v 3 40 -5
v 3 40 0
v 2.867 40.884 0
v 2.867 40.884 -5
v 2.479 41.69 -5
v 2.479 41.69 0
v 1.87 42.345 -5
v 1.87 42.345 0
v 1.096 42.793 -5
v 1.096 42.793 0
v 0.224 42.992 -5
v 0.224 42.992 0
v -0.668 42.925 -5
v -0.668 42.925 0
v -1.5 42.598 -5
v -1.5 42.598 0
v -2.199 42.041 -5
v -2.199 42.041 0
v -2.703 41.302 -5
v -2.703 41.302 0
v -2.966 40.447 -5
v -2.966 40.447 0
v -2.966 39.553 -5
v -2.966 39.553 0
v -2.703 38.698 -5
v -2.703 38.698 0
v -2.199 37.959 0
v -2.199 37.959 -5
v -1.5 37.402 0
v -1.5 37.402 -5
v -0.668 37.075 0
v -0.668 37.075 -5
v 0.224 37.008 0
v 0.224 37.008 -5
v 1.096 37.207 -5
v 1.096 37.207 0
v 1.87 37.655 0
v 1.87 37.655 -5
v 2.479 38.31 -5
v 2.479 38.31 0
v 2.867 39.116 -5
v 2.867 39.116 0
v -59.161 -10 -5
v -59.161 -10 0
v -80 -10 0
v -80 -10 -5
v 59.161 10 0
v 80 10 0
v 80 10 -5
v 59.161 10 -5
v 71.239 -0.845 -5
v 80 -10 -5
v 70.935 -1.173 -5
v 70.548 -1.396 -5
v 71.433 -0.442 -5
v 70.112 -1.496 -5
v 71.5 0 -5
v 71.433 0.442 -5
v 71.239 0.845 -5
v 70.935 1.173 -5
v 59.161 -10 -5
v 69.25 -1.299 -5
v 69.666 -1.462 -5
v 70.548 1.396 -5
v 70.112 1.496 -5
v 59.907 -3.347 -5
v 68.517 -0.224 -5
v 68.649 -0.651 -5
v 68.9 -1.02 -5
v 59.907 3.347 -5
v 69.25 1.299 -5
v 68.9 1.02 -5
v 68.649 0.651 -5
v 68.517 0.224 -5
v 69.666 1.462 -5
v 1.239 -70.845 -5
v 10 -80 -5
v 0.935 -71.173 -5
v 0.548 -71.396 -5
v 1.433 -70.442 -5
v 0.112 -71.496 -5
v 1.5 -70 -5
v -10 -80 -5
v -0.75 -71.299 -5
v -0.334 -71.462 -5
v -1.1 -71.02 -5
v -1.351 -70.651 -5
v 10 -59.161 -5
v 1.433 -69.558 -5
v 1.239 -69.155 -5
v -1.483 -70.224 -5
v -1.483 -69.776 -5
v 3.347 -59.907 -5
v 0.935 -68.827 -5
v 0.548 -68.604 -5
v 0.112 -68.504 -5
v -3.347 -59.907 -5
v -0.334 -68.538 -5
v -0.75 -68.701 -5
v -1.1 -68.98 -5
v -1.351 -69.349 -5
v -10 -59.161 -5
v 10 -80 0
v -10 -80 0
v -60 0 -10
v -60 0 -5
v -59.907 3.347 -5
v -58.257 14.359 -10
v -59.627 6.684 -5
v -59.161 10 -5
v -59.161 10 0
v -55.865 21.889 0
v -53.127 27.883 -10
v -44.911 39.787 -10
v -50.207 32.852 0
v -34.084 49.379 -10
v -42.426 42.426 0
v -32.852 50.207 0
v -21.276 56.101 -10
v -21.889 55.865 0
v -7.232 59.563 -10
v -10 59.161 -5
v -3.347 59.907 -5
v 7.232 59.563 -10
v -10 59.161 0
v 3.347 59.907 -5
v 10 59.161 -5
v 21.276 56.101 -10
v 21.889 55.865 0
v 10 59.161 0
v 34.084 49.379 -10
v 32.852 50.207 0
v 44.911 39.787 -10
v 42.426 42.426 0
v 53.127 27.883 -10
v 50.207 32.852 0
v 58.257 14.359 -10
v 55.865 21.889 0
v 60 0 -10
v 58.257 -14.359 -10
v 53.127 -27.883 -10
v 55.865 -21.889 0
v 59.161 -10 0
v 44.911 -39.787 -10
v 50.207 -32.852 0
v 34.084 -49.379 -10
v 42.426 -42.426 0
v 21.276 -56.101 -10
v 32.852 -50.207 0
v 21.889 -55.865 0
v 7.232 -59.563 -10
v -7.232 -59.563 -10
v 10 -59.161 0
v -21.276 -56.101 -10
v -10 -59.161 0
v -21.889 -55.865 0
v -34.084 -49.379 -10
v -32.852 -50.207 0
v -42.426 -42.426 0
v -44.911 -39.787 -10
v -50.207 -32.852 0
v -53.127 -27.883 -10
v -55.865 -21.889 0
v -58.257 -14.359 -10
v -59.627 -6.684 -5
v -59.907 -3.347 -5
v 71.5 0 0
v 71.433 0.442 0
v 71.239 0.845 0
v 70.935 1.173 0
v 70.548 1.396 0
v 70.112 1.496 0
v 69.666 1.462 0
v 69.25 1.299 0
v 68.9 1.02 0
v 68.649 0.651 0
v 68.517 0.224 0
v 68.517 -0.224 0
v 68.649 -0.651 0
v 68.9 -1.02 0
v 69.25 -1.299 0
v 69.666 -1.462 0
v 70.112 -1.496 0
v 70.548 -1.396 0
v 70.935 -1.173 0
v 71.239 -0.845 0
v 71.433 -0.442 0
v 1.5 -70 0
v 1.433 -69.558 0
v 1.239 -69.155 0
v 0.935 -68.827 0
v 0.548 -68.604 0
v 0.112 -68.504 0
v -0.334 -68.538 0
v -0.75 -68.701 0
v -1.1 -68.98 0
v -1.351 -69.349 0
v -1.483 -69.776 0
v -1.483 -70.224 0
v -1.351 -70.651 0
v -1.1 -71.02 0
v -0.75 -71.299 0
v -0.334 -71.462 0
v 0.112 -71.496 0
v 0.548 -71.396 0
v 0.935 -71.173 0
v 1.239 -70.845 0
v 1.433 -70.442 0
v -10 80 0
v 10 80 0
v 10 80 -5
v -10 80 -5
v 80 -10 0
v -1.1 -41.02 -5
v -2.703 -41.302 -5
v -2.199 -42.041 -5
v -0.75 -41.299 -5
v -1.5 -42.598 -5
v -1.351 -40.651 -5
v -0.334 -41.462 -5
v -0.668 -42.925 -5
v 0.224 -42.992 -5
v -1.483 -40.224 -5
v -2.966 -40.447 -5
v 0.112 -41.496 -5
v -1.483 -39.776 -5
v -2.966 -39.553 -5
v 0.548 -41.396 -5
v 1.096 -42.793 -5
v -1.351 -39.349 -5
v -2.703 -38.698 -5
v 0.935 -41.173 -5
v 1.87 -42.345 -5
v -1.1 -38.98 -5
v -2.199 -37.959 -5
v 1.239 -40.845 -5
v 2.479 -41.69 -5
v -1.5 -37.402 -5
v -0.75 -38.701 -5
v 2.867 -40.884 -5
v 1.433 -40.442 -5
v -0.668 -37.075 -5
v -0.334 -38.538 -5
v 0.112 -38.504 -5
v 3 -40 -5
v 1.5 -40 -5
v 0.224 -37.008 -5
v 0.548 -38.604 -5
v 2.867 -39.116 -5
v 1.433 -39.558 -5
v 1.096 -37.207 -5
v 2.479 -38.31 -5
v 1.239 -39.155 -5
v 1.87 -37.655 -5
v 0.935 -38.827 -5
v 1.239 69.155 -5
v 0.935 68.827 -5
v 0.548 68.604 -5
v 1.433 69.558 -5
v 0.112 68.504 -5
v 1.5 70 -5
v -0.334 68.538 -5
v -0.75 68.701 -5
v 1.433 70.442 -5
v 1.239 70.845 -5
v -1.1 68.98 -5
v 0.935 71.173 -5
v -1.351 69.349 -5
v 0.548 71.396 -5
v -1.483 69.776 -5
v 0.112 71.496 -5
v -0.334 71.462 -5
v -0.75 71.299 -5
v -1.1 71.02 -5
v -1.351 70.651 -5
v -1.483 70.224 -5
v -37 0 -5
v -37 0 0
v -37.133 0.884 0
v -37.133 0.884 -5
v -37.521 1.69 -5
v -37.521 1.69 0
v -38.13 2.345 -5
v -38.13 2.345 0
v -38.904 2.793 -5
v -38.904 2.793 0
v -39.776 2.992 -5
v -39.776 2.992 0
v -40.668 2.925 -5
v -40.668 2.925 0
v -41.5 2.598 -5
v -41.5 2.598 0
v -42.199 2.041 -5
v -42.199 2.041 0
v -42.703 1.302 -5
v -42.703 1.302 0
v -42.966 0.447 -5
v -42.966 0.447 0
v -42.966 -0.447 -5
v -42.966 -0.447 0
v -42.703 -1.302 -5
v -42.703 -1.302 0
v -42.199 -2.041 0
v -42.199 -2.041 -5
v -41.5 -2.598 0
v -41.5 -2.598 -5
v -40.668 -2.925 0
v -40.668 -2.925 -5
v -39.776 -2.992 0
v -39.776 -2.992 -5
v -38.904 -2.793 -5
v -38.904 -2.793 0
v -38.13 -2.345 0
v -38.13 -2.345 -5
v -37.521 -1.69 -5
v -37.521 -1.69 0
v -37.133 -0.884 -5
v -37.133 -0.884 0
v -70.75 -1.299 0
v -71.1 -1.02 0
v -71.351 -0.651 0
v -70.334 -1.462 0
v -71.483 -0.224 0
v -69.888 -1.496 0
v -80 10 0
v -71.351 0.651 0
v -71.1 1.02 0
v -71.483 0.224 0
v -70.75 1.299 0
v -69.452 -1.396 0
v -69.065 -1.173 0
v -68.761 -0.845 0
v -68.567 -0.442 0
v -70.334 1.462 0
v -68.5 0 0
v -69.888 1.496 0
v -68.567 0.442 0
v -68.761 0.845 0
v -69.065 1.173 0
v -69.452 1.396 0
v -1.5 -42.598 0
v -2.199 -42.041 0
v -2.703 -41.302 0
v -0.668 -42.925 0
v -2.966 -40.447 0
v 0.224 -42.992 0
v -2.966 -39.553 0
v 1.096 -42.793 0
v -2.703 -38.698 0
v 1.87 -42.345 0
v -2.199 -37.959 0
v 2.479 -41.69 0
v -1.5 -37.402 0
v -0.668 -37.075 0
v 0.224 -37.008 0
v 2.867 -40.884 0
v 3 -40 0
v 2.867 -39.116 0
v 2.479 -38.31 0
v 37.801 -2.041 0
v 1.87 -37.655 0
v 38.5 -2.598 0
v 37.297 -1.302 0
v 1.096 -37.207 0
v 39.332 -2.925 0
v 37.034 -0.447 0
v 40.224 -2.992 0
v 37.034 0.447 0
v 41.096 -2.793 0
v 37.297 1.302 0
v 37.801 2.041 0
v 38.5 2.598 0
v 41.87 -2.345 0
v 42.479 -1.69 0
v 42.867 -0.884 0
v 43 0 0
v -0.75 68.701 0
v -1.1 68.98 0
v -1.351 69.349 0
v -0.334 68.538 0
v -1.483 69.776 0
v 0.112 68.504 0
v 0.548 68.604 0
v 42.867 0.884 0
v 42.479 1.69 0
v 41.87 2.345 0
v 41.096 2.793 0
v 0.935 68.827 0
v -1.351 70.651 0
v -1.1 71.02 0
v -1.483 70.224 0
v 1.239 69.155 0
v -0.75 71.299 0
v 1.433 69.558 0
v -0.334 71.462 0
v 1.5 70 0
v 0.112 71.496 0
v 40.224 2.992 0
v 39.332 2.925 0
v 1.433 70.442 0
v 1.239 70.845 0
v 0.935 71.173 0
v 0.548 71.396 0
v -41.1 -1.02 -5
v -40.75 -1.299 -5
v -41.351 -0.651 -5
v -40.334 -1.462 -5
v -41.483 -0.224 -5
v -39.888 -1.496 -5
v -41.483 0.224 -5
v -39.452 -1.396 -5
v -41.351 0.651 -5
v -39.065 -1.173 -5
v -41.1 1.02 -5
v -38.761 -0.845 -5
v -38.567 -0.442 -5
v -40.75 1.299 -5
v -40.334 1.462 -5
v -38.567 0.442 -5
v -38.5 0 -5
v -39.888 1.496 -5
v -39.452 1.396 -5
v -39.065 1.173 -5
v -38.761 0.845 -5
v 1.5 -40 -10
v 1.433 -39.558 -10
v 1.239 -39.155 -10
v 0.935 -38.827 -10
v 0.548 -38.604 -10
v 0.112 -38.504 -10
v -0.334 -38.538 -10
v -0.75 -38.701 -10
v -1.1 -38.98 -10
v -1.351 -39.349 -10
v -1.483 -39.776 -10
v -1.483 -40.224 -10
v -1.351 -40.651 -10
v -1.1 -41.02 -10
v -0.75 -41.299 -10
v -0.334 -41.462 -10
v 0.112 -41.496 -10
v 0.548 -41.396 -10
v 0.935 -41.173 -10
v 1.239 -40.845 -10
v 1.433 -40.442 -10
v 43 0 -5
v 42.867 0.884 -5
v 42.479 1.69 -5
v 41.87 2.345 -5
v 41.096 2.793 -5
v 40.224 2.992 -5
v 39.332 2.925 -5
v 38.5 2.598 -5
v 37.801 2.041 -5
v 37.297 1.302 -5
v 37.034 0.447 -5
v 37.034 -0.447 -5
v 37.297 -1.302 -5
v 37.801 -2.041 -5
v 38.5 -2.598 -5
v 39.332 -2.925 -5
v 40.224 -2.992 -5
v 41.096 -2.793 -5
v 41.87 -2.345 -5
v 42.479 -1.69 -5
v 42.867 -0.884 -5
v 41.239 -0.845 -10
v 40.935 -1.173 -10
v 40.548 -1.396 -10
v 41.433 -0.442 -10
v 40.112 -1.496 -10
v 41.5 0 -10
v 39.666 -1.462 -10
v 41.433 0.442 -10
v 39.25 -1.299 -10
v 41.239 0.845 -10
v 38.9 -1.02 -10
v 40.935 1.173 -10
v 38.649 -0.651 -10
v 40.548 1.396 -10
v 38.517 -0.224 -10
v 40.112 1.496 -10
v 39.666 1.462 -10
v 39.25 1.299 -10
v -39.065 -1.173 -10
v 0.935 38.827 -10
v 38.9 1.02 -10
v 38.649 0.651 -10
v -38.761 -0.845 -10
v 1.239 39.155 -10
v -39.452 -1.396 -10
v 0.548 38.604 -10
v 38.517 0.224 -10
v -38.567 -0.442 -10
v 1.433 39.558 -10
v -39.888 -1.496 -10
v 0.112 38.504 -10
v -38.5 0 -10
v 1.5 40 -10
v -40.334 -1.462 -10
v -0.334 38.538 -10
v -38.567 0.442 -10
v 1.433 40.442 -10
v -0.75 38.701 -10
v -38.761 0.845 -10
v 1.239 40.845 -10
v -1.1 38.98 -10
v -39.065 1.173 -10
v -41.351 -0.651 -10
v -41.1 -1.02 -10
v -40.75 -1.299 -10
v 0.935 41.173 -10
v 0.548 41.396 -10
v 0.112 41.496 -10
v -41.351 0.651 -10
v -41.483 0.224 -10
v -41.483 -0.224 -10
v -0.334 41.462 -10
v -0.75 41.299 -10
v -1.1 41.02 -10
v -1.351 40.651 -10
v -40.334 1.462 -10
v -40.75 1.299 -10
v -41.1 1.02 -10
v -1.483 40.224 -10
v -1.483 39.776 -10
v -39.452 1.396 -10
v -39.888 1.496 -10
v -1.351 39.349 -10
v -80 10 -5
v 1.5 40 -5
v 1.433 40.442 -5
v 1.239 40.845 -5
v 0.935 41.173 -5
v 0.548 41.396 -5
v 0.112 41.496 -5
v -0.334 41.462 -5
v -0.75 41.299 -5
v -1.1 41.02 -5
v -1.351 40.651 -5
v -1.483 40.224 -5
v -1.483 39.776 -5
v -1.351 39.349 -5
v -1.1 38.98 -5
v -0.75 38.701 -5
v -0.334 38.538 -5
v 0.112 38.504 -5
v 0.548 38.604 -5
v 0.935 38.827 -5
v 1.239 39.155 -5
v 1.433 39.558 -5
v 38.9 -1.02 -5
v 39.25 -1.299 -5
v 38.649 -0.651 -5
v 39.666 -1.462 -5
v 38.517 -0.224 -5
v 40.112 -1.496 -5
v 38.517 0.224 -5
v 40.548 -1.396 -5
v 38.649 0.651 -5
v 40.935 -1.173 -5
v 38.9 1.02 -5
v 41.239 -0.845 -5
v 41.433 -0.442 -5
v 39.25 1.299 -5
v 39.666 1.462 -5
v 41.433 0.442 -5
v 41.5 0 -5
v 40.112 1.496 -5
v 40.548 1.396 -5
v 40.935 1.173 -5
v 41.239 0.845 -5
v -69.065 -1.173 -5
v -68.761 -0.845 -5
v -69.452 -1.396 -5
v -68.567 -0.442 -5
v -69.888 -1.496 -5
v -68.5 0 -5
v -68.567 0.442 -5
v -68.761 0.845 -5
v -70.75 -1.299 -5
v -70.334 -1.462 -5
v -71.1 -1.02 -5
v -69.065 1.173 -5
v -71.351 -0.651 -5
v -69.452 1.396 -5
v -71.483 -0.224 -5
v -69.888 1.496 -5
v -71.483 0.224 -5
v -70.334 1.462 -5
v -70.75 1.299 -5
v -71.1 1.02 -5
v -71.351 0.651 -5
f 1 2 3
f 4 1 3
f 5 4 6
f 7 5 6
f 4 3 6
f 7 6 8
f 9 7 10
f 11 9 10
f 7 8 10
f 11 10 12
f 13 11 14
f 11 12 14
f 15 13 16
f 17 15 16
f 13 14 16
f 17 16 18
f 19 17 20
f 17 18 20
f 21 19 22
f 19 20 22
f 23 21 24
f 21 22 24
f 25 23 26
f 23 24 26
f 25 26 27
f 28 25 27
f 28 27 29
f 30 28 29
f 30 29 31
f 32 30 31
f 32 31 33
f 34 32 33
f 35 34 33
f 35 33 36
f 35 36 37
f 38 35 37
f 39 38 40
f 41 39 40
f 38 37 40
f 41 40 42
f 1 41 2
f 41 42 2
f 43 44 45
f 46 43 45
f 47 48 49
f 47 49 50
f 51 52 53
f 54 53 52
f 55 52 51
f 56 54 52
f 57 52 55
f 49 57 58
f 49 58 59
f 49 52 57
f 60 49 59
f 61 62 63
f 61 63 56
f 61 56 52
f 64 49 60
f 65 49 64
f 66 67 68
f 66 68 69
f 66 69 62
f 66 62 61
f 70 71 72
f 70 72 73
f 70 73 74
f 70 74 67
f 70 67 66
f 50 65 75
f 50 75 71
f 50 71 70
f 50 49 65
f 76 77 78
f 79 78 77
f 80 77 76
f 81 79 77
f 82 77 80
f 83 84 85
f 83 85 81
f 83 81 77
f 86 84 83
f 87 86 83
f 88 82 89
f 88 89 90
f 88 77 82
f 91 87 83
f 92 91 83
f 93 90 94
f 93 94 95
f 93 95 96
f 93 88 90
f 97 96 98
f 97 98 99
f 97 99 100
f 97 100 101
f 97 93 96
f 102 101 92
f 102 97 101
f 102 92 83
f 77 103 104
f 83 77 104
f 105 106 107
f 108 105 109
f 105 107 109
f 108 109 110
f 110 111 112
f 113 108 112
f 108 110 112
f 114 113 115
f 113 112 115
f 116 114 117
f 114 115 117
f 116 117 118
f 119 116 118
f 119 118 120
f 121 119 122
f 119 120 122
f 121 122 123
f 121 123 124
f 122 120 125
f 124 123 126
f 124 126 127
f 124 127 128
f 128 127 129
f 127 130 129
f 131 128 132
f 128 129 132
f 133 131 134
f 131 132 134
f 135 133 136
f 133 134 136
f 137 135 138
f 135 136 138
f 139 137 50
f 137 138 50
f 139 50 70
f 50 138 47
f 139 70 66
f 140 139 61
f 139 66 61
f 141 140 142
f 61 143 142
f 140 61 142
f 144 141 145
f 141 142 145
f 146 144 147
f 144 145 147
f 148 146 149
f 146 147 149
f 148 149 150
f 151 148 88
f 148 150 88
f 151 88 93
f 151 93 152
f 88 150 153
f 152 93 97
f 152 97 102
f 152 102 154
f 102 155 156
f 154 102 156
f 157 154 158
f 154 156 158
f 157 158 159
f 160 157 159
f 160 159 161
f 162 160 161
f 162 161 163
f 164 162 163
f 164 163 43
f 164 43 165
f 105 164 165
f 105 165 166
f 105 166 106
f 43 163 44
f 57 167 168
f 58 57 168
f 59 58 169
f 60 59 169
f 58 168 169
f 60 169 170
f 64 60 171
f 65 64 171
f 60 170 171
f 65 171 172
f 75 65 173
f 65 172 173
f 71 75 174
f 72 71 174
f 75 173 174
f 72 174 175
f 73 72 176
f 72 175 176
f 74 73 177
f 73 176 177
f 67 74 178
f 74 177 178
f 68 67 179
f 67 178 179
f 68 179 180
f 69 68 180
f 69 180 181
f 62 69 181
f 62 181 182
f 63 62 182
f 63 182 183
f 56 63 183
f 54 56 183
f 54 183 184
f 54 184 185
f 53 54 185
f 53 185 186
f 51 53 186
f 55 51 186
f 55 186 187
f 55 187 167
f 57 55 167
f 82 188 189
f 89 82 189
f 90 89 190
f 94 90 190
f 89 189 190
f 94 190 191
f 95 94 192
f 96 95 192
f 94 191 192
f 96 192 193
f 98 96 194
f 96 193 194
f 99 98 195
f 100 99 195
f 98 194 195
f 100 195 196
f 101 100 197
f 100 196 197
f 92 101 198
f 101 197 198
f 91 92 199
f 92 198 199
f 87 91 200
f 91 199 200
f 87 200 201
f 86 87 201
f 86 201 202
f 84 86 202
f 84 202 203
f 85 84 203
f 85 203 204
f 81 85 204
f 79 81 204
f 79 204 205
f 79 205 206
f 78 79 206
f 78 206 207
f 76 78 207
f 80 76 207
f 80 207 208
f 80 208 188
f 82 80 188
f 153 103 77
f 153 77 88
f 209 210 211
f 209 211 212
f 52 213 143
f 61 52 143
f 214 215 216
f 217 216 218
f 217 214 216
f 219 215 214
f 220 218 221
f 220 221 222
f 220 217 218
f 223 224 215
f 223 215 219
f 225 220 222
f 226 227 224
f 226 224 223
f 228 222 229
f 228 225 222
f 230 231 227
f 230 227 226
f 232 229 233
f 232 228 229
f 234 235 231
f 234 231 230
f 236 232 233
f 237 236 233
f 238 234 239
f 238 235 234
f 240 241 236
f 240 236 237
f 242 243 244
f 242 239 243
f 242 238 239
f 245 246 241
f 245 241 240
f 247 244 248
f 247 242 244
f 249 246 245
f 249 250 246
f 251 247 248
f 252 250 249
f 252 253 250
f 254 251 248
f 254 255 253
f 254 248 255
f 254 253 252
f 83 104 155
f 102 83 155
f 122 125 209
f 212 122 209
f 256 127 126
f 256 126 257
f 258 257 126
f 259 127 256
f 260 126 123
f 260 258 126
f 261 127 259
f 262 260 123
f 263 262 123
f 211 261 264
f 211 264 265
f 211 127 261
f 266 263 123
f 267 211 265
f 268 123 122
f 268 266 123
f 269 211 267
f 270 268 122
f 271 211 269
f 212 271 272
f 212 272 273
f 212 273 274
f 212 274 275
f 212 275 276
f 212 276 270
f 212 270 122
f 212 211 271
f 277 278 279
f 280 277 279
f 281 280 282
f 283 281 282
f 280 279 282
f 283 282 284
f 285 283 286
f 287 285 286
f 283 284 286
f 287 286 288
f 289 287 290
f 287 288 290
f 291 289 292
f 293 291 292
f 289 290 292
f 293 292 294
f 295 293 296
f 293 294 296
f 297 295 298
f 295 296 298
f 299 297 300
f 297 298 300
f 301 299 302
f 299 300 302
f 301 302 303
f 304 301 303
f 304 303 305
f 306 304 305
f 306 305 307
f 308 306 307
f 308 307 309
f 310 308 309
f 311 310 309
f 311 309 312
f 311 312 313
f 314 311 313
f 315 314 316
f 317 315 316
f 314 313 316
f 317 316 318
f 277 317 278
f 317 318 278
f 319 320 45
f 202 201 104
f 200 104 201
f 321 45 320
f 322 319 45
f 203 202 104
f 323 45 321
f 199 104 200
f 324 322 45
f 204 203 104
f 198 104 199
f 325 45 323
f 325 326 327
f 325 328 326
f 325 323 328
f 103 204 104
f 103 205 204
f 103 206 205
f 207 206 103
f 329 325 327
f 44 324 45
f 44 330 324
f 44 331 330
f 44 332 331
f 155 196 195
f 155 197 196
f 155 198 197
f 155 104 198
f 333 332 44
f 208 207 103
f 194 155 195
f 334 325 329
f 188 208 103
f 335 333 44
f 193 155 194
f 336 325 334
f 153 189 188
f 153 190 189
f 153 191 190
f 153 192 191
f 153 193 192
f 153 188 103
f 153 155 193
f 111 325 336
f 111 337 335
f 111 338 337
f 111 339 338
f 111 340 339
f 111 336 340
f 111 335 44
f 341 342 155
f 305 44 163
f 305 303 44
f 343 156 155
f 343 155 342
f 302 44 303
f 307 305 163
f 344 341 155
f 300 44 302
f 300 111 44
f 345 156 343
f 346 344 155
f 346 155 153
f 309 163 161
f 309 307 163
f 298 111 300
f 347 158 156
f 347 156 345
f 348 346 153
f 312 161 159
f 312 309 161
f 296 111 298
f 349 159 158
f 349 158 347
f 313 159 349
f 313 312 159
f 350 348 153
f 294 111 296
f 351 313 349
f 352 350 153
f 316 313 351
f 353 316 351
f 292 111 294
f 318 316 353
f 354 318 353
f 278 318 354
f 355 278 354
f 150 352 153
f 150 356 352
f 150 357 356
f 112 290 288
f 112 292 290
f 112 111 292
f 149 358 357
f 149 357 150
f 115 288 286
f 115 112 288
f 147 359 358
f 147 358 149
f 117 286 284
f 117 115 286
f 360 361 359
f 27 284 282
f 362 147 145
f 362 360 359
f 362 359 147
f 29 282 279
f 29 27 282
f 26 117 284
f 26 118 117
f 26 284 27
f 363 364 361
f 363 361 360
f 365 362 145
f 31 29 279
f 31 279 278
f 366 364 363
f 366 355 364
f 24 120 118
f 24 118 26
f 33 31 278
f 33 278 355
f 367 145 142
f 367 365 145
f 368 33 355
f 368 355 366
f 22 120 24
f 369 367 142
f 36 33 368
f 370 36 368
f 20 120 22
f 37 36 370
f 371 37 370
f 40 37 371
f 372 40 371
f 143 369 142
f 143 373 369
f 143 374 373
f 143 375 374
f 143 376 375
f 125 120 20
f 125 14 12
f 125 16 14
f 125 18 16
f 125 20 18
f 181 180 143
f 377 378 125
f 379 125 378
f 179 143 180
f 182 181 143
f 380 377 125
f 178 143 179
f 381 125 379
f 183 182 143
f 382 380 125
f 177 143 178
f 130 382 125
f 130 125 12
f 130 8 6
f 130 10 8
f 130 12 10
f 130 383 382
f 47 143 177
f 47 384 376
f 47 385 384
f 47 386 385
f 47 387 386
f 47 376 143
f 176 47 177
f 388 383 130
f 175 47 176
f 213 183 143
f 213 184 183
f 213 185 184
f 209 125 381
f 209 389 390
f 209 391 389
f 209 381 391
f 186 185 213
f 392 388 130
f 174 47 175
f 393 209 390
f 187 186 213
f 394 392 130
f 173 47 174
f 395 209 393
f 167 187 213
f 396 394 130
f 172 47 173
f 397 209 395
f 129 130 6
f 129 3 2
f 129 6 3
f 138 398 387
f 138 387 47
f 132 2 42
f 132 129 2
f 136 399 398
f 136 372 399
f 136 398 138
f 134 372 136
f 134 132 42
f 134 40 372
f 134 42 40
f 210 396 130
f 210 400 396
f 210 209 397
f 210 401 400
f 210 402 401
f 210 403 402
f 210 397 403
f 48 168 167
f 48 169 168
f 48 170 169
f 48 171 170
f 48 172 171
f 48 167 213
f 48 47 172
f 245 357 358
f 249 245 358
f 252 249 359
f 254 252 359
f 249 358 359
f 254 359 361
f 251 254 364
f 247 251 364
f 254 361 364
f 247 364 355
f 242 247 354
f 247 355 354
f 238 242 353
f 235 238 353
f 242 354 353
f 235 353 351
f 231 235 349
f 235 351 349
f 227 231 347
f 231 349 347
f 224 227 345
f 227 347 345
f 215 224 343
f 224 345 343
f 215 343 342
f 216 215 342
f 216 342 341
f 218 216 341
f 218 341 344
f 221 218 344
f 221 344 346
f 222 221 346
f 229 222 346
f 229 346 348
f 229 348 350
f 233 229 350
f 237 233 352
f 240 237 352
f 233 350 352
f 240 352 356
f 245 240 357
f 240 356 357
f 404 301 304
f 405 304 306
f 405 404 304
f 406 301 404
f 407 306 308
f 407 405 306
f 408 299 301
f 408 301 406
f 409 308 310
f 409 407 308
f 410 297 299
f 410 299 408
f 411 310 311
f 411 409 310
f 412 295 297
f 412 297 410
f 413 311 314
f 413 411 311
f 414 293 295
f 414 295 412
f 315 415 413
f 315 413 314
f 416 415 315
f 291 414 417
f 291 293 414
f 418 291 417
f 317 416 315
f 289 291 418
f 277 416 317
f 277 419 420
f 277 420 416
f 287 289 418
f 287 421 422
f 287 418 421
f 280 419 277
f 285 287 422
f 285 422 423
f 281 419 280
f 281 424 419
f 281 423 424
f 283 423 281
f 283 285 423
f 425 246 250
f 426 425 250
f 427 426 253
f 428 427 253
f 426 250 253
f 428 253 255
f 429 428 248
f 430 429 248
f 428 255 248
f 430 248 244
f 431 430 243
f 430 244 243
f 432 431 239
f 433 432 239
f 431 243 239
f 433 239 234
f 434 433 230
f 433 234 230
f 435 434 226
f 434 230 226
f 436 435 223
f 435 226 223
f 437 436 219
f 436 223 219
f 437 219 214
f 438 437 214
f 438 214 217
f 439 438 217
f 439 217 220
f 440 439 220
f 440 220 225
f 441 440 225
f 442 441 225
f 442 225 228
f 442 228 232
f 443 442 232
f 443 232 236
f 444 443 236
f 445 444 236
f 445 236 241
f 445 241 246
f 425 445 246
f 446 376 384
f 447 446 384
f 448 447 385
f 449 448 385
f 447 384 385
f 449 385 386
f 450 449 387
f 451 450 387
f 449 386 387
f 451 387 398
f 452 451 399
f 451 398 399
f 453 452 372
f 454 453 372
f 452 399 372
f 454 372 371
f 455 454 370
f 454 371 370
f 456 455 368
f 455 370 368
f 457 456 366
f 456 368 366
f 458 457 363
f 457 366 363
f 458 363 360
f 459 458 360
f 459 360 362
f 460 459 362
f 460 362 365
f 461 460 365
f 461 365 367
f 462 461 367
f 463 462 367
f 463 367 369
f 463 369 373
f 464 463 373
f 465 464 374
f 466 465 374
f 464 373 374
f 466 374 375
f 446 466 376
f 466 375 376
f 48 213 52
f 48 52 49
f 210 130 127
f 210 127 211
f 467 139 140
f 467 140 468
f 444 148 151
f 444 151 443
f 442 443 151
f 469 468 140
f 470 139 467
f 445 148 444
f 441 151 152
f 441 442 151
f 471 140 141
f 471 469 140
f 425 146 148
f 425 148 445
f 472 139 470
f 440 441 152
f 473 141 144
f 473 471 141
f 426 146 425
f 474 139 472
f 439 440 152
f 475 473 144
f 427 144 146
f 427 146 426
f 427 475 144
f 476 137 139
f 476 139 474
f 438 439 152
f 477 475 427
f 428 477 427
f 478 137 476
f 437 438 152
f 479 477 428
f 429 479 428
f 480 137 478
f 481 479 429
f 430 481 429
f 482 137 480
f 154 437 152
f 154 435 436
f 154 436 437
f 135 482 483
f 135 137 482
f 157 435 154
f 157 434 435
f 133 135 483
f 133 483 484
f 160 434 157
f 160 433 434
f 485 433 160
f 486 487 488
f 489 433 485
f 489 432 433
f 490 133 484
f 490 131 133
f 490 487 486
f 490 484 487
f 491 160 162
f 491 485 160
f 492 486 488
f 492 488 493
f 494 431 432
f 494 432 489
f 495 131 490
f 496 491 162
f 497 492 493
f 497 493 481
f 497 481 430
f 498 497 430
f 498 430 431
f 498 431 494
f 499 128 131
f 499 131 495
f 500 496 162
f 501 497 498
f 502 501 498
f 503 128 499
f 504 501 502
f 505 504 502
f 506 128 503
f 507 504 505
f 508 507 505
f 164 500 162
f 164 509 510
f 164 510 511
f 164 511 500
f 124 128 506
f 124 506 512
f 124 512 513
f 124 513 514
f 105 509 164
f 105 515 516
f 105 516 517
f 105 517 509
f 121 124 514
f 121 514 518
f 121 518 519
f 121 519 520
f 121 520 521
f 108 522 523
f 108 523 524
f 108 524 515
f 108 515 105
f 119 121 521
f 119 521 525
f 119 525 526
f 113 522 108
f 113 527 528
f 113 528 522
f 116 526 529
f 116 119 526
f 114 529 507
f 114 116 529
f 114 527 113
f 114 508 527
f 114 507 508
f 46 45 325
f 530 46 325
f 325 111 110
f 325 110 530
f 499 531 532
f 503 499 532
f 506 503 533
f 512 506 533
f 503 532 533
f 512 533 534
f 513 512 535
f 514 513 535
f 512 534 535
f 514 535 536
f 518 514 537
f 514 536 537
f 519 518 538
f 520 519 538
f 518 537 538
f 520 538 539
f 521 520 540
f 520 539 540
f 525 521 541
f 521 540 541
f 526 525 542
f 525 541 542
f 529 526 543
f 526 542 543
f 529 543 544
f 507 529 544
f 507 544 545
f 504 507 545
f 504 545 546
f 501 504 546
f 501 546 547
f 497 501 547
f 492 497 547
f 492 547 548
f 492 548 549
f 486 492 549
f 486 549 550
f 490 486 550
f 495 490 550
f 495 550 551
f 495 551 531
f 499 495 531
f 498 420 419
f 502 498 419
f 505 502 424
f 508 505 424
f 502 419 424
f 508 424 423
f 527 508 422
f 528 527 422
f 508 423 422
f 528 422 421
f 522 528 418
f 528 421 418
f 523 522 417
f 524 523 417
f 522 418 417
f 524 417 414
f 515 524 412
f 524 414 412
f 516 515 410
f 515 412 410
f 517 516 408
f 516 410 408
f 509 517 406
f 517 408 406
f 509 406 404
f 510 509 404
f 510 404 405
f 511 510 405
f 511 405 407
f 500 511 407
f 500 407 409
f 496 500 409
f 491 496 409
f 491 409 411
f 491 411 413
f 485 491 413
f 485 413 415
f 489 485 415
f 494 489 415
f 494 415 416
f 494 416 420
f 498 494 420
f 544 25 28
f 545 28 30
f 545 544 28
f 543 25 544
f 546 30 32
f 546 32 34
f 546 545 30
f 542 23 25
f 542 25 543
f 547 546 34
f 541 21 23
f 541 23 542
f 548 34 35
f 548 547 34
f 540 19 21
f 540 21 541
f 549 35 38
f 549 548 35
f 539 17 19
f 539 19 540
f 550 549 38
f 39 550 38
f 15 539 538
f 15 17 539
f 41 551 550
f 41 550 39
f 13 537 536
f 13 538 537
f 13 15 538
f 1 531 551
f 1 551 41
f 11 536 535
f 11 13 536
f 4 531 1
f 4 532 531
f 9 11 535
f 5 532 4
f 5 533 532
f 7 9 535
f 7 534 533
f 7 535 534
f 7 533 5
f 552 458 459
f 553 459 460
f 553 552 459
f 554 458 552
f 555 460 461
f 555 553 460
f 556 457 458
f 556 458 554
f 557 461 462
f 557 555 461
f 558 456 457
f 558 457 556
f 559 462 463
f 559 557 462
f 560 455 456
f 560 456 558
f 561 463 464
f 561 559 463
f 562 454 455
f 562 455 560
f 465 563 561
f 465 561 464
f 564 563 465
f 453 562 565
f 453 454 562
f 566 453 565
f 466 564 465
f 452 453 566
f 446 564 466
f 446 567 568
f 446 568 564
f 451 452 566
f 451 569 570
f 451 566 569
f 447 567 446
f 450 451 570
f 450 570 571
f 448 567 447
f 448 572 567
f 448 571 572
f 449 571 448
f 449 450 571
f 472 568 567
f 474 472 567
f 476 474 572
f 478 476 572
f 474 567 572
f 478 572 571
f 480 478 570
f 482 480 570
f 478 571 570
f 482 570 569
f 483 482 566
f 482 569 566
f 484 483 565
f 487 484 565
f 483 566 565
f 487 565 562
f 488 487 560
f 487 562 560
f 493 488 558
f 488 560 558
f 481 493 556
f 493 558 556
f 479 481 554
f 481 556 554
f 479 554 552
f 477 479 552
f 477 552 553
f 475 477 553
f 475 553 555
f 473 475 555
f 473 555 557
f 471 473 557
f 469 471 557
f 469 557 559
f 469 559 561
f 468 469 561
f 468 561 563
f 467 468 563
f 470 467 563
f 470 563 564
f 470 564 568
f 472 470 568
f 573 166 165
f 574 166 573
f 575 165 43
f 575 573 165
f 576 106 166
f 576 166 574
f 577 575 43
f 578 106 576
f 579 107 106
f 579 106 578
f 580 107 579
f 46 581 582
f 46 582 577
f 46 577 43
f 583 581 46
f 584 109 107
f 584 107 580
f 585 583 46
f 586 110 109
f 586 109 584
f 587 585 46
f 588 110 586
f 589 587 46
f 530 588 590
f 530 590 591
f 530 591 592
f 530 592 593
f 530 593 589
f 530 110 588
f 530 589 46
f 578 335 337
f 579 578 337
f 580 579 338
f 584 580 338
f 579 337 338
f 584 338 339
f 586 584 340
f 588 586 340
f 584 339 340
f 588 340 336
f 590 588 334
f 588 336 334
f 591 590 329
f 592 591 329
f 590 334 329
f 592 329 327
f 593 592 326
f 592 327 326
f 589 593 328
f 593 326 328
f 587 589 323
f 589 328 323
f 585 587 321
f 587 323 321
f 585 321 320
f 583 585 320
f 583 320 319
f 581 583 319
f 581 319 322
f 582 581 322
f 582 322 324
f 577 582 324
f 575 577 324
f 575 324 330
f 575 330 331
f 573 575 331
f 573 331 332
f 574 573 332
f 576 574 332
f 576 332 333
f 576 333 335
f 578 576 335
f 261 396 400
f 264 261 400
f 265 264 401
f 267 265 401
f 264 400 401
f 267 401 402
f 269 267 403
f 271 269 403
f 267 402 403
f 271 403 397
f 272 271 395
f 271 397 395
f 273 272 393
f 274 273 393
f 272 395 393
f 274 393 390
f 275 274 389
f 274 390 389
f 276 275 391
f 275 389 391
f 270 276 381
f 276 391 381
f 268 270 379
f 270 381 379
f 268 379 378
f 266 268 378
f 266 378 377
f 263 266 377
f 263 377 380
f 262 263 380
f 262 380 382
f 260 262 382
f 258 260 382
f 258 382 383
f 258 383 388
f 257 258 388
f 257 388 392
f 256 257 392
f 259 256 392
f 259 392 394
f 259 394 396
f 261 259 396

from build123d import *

# Parameters (mm, degrees)
SKETCH1_R           = 60
BOSS_EXTRUDE1_DEPTH = 5
SKETCH3_W           = 20
SKETCH3_H           = 30
SKETCH3_W_2         = 30
SKETCH3_H_2         = 20
BOSS_EXTRUDE2_DEPTH = 5
SKETCH6_R           = 60
BOSS_EXTRUDE3_DEPTH = 10
SKETCH7_R           = 70
CUT_EXTRUDE2_DEPTH  = 5
SKETCH8_R           = 3
CUT_EXTRUDE7_DEPTH  = 5
SKETCH13_R          = 1.5
CUT_EXTRUDE10_DEPTH = 10


with BuildPart() as part:
    # Sketch1 → Boss-Extrude1 (new body)
    with BuildSketch(Plane.XY):
        Circle(SKETCH1_R)
    extrude(amount=BOSS_EXTRUDE1_DEPTH)

    # Sketch3 → Boss-Extrude2 (add)
    with BuildSketch(Plane(origin=(0, 0, 0), x_dir=(-1, 0, 0), z_dir=(0, 0, -1))):
        with Locations((0, -65)):
            Rectangle(SKETCH3_W, SKETCH3_H)
        with Locations((0, 65)):
            Rectangle(SKETCH3_W, SKETCH3_H)
        with Locations((65, 0)):
            Rectangle(SKETCH3_W_2, SKETCH3_H_2)
        with Locations((-65, 0)):
            Rectangle(SKETCH3_W_2, SKETCH3_H_2)
    extrude(amount=BOSS_EXTRUDE2_DEPTH)

    # Sketch6 → Boss-Extrude3 (add)
    with BuildSketch(Plane(origin=(0, 0, 0), x_dir=(-1, 0, 0), z_dir=(0, 0, -1))):
        Circle(SKETCH6_R)
    extrude(amount=BOSS_EXTRUDE3_DEPTH)

    # Sketch7 → Cut-Extrude2 (cut)
    with BuildSketch(Plane.XY.offset(5)):
        Circle(SKETCH7_R)
    extrude(amount=-CUT_EXTRUDE2_DEPTH, mode=Mode.SUBTRACT)

    # Sketch8 → Cut-Extrude7 (cut)
    with BuildSketch(Plane.XY):
        with Locations((0, -40)):
            Circle(SKETCH8_R)
        with Locations((0, 40)):
            Circle(SKETCH8_R)
        with Locations((-40, 0)):
            Circle(SKETCH8_R)
        with Locations((40, 0)):
            Circle(SKETCH8_R)
    extrude(amount=-CUT_EXTRUDE7_DEPTH, mode=Mode.SUBTRACT)

    # Sketch13 → Cut-Extrude10 (cut)
    with BuildSketch(Plane.XY):
        with Locations((-40, 0)):
            Circle(SKETCH13_R)
        with Locations((40, 0)):
            Circle(SKETCH13_R)
        with Locations((-70, 0)):
            Circle(SKETCH13_R)
        with Locations((70, 0)):
            Circle(SKETCH13_R)
        with Locations((0, -40)):
            Circle(SKETCH13_R)
        with Locations((0, -70)):
            Circle(SKETCH13_R)
        with Locations((0, 40)):
            Circle(SKETCH13_R)
        with Locations((0, 70)):
            Circle(SKETCH13_R)
    extrude(amount=-CUT_EXTRUDE10_DEPTH, mode=Mode.SUBTRACT)


solid = part.part
